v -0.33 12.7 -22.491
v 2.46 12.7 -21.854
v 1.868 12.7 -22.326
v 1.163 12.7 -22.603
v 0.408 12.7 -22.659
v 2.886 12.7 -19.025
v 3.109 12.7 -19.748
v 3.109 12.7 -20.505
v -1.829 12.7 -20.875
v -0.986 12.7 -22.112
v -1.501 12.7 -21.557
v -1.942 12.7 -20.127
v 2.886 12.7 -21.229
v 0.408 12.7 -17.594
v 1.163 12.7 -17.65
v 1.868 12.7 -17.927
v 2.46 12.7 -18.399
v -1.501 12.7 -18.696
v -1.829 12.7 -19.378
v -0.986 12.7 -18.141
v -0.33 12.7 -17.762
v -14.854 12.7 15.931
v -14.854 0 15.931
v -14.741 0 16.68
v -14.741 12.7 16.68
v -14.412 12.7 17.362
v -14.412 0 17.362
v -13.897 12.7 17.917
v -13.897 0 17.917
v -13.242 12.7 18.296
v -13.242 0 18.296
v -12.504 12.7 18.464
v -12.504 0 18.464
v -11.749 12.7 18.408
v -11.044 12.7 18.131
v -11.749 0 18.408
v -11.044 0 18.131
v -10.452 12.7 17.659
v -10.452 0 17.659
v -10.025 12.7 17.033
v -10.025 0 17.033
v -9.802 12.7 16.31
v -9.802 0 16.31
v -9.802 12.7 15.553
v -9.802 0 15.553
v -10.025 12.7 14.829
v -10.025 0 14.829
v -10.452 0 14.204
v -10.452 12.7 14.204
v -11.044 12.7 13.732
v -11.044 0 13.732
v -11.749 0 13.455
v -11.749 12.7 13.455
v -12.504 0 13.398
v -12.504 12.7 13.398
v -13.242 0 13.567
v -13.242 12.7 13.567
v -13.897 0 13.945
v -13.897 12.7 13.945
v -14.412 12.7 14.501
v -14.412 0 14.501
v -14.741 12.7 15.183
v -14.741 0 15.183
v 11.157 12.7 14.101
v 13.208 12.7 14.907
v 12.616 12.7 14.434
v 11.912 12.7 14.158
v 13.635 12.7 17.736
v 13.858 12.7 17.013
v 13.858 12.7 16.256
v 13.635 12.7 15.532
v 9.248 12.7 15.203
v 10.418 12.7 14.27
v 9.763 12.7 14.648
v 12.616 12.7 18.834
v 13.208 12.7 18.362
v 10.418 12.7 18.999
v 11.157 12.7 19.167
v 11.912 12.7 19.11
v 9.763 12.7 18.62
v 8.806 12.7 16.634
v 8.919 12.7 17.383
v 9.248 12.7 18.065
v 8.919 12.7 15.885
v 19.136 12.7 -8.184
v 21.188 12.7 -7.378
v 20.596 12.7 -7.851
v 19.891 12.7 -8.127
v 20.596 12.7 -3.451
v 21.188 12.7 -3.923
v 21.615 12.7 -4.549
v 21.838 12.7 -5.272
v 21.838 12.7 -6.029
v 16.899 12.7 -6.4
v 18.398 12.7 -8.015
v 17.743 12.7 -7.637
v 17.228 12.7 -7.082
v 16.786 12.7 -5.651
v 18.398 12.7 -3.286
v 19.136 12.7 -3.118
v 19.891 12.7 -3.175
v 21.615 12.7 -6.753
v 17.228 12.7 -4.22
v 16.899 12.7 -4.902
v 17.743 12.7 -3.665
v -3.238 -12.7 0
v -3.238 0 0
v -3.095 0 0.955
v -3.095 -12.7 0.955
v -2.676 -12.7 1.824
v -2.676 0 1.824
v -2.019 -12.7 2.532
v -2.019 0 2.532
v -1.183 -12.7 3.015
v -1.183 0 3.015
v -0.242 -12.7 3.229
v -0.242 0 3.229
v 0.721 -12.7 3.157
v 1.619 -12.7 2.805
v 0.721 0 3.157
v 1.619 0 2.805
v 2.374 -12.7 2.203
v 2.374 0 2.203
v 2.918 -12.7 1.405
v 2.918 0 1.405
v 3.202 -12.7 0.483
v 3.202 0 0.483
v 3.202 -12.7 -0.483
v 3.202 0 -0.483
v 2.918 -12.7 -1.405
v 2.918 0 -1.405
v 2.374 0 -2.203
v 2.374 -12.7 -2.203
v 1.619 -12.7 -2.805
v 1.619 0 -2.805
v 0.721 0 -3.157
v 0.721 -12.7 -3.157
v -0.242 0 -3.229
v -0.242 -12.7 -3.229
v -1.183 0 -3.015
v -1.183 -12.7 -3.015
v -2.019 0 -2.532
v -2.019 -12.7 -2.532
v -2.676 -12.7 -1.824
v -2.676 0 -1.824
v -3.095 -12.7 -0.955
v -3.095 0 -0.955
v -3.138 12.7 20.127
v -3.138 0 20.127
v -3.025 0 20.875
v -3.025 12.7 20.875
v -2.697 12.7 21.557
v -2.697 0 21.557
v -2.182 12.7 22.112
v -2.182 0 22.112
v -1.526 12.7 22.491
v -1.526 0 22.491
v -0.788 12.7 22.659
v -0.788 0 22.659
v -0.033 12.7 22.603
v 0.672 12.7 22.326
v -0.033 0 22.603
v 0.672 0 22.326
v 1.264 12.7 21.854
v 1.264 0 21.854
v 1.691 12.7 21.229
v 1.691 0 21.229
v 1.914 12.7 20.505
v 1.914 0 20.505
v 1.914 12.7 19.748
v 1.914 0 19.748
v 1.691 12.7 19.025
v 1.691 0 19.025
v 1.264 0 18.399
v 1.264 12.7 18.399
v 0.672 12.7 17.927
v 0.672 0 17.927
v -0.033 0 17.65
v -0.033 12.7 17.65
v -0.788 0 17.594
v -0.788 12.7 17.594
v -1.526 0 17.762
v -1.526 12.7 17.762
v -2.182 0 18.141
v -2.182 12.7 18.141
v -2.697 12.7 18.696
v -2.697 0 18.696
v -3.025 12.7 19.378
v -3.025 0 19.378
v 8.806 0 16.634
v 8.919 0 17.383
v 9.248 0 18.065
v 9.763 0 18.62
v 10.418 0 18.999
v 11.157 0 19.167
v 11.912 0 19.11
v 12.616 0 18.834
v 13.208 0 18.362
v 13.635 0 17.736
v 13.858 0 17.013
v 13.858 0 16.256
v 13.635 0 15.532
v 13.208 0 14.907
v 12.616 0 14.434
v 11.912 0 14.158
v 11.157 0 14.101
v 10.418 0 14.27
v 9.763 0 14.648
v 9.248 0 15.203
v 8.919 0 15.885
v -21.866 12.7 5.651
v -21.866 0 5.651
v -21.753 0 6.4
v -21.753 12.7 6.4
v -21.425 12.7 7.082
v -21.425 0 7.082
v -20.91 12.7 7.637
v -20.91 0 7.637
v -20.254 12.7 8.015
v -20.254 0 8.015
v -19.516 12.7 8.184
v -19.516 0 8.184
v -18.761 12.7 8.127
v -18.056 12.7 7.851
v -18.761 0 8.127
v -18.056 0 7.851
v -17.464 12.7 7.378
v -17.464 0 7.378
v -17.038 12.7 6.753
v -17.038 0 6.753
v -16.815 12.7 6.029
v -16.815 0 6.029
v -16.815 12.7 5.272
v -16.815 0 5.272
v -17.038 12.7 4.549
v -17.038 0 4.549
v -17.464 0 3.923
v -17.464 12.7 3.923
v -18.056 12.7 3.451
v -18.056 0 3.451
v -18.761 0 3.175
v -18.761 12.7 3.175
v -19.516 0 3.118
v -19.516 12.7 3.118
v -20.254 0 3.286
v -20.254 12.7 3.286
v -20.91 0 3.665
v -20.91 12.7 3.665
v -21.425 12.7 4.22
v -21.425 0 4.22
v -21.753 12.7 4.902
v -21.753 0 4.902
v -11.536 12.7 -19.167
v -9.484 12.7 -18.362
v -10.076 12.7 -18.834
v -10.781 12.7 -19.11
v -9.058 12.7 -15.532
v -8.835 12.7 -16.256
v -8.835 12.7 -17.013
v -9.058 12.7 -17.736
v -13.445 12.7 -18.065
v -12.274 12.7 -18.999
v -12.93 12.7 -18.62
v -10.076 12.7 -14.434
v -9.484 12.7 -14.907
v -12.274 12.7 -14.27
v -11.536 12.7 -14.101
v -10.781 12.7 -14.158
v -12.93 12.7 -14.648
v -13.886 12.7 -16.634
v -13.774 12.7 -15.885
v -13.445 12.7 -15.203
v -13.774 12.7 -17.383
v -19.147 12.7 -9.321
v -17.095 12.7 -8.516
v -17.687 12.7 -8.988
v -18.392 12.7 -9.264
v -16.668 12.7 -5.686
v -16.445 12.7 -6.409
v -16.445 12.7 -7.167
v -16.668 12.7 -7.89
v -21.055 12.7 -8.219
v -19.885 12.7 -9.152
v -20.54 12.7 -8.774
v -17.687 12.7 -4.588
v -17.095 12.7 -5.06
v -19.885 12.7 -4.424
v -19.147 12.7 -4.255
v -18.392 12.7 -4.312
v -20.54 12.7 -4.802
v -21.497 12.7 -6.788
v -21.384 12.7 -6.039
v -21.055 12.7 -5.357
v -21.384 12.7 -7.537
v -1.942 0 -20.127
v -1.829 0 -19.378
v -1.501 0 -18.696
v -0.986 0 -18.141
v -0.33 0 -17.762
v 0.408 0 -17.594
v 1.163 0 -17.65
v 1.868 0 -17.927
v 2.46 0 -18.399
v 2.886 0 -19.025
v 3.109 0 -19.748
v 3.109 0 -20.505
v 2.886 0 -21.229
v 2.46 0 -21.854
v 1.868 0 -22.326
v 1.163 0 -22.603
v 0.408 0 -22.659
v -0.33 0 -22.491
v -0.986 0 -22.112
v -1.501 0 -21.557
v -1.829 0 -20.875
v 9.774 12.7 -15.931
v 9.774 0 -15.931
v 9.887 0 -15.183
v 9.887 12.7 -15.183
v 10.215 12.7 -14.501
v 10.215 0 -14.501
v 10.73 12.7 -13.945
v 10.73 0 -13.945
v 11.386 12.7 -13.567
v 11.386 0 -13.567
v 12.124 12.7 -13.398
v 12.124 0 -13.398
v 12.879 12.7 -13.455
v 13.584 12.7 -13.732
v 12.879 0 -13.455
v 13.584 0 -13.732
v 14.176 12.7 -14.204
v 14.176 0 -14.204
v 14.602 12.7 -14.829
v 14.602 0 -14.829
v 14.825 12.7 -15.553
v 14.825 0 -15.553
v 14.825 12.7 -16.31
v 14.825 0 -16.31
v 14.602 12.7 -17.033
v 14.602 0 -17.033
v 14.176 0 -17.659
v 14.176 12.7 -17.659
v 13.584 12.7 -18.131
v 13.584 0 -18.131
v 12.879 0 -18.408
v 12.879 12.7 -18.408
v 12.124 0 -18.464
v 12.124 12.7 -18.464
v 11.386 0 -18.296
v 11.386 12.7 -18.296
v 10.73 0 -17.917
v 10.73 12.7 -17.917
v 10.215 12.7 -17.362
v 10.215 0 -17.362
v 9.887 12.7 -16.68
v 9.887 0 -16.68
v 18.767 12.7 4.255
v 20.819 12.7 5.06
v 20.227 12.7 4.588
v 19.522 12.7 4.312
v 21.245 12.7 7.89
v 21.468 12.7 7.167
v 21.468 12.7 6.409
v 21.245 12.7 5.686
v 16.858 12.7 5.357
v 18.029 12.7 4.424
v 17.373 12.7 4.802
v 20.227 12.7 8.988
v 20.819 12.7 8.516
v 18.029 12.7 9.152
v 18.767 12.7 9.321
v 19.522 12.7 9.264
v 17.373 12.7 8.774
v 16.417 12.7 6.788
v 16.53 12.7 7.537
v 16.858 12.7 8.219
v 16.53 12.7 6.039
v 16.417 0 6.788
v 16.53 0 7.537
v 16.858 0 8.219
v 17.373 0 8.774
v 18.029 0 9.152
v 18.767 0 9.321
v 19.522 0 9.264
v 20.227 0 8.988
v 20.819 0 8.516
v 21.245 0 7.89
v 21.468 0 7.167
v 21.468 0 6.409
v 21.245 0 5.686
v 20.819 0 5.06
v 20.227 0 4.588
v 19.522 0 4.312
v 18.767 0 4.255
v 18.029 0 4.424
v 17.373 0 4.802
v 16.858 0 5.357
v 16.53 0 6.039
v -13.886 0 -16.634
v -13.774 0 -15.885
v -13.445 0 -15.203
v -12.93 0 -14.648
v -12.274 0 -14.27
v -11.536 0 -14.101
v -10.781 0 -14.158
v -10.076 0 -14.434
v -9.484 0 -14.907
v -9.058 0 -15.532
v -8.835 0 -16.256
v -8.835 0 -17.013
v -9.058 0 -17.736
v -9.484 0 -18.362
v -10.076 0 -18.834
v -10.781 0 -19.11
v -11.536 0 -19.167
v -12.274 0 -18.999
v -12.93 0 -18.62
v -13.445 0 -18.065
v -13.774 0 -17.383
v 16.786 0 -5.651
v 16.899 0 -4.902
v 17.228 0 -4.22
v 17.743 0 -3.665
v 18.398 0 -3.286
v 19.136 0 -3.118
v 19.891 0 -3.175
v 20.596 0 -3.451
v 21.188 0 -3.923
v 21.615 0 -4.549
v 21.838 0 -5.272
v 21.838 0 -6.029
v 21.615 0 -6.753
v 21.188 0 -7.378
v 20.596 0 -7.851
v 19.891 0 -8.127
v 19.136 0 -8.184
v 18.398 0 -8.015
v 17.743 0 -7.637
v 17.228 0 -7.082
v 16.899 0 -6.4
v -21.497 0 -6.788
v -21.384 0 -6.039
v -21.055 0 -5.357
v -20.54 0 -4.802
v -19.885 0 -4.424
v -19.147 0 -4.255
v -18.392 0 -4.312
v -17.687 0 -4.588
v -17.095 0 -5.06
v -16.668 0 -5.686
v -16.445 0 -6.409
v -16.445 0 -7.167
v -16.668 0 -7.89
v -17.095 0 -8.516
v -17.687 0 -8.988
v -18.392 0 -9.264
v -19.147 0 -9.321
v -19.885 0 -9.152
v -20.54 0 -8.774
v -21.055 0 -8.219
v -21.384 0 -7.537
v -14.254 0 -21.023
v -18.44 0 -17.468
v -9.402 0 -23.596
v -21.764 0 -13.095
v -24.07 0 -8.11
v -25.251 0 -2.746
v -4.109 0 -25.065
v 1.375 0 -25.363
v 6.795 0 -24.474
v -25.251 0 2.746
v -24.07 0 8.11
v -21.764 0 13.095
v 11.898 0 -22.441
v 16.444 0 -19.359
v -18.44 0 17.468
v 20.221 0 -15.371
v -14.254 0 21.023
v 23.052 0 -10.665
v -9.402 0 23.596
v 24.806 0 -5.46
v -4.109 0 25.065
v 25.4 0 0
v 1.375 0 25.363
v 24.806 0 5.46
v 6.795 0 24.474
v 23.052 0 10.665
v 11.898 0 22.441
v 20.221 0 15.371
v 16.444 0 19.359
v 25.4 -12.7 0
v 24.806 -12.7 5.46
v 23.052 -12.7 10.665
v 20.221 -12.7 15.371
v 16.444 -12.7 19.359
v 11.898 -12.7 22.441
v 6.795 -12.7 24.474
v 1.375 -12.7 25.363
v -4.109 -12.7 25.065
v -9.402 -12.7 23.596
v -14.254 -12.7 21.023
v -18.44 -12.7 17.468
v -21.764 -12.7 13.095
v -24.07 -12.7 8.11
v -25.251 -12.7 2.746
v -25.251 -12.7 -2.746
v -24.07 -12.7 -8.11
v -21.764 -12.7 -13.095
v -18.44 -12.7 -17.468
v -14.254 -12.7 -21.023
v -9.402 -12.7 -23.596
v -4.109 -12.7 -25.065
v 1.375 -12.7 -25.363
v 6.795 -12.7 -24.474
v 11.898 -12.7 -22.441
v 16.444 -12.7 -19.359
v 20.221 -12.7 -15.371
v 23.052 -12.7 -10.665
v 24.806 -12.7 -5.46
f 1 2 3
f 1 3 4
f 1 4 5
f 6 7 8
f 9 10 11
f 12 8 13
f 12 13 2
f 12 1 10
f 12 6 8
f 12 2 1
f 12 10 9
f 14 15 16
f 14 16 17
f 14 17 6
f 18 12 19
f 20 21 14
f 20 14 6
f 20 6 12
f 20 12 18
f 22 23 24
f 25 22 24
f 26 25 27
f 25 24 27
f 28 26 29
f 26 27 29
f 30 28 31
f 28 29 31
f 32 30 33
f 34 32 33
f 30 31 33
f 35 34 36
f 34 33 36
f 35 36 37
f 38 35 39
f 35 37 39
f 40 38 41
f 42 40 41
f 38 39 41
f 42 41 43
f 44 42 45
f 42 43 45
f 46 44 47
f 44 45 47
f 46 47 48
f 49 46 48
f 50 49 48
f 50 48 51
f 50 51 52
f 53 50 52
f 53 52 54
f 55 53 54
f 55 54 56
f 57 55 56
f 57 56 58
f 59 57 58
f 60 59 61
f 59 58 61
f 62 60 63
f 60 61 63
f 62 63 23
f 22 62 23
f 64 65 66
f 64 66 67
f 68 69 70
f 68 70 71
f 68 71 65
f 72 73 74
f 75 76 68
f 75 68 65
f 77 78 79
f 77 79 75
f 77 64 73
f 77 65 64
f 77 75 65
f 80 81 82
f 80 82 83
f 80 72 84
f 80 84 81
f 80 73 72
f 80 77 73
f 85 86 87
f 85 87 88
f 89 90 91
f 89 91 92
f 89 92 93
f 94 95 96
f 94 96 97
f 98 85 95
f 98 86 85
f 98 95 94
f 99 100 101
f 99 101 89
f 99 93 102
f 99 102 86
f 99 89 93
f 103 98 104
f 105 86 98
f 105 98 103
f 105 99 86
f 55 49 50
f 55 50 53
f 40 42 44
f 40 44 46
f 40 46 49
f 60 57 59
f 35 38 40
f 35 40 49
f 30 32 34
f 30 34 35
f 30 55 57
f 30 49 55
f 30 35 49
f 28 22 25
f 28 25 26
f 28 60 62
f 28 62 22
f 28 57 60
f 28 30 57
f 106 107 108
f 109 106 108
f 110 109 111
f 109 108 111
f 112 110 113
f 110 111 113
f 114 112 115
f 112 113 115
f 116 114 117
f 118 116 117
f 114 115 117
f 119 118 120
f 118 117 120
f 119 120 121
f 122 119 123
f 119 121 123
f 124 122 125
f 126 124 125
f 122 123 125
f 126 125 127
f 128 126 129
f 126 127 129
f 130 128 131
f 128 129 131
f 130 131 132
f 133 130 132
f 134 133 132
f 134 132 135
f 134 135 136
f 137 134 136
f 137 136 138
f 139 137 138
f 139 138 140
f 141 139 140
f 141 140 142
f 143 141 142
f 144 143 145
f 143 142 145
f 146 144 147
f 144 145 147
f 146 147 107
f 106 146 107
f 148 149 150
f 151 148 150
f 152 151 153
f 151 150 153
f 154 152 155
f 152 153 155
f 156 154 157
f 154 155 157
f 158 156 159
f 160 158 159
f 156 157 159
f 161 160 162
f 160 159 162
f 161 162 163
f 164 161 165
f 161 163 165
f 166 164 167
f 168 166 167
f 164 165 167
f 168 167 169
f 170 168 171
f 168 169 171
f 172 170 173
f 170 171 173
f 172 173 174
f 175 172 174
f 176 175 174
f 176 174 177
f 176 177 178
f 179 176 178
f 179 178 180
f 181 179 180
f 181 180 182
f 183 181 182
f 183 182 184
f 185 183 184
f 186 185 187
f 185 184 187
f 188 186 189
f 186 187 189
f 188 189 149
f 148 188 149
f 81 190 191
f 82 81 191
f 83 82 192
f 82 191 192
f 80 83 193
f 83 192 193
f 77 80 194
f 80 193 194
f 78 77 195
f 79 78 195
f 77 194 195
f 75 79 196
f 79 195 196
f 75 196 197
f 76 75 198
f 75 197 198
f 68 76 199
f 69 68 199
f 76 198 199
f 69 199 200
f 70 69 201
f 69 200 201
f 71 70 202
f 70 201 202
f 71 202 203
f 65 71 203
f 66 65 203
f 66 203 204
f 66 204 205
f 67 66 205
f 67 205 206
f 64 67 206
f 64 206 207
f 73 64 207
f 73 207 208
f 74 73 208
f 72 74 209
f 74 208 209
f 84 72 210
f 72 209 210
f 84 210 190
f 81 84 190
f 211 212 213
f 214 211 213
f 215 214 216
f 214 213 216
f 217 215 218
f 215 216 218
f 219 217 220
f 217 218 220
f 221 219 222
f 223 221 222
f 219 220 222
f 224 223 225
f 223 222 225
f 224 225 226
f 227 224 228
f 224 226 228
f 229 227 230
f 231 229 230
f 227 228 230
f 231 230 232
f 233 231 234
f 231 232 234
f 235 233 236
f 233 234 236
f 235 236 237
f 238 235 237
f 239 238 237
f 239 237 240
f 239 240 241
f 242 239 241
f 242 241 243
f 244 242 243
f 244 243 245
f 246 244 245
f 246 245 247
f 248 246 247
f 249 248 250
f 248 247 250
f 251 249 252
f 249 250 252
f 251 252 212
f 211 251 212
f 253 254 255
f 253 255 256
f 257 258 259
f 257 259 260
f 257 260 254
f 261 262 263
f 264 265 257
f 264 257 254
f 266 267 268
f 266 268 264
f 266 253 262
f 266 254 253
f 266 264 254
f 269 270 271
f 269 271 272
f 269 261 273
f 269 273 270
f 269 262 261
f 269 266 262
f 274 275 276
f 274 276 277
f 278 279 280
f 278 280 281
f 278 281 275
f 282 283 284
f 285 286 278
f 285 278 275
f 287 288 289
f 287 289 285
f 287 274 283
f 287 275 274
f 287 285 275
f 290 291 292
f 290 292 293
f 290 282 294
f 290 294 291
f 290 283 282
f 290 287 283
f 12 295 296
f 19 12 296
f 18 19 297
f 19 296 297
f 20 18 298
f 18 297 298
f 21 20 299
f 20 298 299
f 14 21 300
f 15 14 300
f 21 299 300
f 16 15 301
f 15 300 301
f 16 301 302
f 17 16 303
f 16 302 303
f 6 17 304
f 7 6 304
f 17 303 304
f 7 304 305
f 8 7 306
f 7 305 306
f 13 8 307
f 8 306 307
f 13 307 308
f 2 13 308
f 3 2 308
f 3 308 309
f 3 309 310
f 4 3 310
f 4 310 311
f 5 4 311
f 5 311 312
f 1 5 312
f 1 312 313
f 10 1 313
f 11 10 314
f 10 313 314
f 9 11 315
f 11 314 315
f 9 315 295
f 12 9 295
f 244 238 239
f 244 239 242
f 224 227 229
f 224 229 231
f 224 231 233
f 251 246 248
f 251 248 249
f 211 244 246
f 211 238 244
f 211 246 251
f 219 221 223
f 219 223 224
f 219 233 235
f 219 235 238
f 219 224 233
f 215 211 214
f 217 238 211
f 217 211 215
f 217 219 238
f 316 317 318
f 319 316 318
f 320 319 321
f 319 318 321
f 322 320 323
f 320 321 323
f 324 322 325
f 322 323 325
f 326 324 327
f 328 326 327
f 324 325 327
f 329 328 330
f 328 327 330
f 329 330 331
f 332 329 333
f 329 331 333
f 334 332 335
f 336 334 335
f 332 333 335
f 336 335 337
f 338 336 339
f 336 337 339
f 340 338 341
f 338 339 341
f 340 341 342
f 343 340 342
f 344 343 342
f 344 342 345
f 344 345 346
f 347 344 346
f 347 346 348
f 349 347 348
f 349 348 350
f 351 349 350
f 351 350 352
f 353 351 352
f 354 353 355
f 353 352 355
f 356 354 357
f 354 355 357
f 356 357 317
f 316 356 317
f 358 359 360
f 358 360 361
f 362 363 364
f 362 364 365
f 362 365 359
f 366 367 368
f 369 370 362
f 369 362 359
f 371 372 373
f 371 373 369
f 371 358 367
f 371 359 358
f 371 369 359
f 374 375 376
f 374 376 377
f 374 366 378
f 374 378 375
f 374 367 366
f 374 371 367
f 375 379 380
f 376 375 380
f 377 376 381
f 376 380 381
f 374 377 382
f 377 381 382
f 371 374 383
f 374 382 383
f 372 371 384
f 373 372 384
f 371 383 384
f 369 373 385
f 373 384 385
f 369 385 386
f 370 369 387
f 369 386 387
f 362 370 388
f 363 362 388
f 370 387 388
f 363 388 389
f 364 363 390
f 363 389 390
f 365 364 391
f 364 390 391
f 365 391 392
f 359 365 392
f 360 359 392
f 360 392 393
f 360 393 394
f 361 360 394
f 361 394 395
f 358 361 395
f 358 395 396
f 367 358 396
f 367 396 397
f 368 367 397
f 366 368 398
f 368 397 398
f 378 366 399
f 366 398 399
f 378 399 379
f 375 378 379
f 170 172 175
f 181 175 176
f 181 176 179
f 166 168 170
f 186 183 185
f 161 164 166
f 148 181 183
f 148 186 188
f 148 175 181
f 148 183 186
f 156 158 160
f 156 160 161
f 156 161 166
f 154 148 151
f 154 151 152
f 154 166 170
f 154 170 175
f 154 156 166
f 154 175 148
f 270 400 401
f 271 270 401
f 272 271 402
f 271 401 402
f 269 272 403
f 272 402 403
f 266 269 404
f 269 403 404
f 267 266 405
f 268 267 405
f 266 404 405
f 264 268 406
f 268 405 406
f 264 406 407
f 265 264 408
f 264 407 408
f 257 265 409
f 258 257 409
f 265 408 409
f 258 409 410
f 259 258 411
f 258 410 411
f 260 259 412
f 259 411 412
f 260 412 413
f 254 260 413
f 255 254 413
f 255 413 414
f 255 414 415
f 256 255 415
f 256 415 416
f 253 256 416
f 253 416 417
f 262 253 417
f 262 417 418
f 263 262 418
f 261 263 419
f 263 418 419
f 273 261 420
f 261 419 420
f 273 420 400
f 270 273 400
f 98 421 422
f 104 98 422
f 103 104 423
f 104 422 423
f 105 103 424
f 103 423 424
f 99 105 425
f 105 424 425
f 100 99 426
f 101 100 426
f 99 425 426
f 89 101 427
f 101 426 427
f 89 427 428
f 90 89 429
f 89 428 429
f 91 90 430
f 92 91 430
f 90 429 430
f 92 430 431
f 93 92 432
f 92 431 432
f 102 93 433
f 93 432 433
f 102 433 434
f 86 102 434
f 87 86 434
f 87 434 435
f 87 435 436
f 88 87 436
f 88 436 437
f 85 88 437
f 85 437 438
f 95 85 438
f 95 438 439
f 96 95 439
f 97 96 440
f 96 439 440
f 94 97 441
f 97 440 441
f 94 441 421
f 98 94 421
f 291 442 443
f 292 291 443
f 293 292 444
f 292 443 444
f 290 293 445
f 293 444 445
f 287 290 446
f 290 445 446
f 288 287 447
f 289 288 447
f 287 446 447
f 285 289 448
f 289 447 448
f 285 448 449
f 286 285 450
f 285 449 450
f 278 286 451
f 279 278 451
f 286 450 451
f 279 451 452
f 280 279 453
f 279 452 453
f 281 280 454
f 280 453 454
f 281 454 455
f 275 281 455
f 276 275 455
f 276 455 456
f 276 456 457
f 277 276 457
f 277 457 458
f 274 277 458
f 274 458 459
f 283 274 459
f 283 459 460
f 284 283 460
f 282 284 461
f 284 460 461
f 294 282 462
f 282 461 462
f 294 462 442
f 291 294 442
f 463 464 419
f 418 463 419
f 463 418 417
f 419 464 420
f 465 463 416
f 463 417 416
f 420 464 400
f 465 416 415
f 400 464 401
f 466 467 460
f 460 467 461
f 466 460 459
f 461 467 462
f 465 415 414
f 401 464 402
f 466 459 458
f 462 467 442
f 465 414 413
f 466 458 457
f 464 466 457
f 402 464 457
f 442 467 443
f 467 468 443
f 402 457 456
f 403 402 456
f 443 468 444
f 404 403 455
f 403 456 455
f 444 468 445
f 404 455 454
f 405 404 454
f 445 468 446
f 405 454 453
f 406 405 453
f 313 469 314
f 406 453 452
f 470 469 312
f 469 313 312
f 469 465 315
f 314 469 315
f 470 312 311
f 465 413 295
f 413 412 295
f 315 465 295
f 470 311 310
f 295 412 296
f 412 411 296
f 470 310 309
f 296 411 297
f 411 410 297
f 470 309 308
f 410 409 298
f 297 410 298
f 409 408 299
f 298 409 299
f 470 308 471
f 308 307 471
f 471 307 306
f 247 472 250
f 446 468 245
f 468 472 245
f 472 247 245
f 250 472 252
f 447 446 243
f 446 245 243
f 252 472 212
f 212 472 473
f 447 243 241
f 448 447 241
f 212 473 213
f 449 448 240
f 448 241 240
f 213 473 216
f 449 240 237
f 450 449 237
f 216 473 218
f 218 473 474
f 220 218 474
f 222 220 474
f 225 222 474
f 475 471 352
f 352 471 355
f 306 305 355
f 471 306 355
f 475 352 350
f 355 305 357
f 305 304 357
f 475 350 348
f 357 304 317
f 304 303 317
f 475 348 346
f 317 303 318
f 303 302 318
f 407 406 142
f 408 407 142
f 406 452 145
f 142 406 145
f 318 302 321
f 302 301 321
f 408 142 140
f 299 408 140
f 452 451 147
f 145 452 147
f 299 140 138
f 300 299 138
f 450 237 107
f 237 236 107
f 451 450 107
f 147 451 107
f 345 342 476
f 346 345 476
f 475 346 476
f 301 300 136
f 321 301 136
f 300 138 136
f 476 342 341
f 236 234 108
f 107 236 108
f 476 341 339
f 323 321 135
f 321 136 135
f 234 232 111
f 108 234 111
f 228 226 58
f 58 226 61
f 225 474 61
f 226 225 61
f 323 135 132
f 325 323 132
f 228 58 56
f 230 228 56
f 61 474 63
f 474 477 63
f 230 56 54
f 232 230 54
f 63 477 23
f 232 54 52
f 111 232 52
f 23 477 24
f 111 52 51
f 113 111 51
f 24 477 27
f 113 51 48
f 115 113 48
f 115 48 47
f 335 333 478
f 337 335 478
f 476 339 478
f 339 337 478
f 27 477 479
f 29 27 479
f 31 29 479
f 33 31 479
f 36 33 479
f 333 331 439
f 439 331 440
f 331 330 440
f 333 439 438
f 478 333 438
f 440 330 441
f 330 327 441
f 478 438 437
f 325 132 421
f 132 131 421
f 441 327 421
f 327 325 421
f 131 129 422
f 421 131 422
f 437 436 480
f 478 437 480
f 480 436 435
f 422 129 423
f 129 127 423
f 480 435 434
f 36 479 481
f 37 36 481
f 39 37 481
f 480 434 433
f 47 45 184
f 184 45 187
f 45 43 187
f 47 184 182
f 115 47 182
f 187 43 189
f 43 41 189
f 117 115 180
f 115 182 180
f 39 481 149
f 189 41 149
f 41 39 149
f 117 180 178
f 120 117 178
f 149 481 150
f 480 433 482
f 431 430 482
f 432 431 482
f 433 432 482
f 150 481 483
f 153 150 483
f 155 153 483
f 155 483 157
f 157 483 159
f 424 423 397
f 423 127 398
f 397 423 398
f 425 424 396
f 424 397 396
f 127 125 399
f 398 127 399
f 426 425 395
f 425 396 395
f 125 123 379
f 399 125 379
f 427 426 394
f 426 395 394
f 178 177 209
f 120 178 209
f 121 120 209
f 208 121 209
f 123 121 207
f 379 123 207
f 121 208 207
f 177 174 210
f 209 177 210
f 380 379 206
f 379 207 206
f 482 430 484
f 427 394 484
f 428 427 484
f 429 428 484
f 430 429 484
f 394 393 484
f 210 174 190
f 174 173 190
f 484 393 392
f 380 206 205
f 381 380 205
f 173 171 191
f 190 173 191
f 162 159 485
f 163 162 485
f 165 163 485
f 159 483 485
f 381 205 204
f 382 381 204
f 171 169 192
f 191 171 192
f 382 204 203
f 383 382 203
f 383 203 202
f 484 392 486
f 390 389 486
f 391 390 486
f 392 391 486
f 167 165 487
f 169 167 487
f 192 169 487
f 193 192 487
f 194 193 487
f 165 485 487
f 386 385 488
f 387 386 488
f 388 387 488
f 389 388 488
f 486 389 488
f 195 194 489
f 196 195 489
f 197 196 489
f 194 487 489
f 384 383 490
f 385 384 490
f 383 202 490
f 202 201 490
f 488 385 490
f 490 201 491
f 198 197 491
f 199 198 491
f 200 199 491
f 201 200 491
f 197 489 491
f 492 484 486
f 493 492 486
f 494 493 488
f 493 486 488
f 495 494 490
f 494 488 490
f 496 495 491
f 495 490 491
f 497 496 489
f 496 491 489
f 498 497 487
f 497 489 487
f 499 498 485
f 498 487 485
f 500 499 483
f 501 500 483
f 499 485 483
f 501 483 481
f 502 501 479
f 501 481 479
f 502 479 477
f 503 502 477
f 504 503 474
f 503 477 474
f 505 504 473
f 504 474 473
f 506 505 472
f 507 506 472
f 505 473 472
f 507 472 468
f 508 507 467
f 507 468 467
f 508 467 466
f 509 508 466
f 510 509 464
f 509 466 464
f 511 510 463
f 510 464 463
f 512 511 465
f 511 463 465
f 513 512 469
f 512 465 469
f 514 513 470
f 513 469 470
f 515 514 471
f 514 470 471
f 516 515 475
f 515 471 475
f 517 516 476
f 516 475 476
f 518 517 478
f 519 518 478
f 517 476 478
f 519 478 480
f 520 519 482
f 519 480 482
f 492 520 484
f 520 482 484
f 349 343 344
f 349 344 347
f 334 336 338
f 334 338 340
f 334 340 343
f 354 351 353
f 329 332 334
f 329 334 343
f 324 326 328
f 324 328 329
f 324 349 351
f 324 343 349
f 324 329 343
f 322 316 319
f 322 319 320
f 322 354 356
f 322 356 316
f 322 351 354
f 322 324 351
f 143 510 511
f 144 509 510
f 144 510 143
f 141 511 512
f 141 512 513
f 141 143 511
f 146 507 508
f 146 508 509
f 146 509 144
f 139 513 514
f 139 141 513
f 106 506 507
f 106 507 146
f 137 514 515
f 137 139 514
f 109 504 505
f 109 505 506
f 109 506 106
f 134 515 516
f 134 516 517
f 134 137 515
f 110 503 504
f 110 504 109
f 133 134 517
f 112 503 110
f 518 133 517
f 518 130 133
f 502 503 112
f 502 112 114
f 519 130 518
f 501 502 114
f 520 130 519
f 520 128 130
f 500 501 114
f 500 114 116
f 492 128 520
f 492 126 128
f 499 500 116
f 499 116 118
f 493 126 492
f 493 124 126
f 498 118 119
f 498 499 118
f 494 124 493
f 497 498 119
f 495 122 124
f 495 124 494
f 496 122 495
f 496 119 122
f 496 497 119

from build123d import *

# Parameters (mm, degrees)
F0_R     = 25.4
F1_DEPTH = 12.7
F2_R     = 2.54
F3_DEPTH = 12.7
F4_R     = 3.2385
F5_DEPTH = 12.7


with BuildPart() as f1:
    # F0 (on Front) → F1 (new body)
    with BuildSketch(Plane.XZ):
        Circle(F0_R)
    extrude(amount=F1_DEPTH)

    # F2 (on face) → F3 (join)
    with BuildSketch(Plane(origin=(0, 0, 0), x_dir=(-1, 0, 0), z_dir=(0, 1, 0))):
        with Locations((12.313798, 15.931344)):
            Circle(F2_R)
        with Locations((0.597863, 20.126597)):
            Circle(F2_R)
        with Locations((-11.346435, 16.634174)):
            Circle(F2_R)
        with Locations((-18.956781, 6.788062)):
            Circle(F2_R)
        with Locations((-19.326281, -5.650859)):
            Circle(F2_R)
        with Locations((-12.313798, -15.931344)):
            Circle(F2_R)
        with Locations((-0.597863, -20.126597)):
            Circle(F2_R)
        with Locations((11.346435, -16.634174)):
            Circle(F2_R)
        with Locations((18.956781, -6.788062)):
            Circle(F2_R)
        with Locations((19.326281, 5.650859)):
            Circle(F2_R)
    extrude(amount=F3_DEPTH)

    # F4 (on face) → F5 (cut)
    with BuildSketch(Plane(origin=(0, 0, 0), x_dir=(-1, 0, 0), z_dir=(0, 1, 0))):
        Circle(F4_R)
    extrude(amount=-F5_DEPTH, mode=Mode.SUBTRACT)


solid = f1.part
